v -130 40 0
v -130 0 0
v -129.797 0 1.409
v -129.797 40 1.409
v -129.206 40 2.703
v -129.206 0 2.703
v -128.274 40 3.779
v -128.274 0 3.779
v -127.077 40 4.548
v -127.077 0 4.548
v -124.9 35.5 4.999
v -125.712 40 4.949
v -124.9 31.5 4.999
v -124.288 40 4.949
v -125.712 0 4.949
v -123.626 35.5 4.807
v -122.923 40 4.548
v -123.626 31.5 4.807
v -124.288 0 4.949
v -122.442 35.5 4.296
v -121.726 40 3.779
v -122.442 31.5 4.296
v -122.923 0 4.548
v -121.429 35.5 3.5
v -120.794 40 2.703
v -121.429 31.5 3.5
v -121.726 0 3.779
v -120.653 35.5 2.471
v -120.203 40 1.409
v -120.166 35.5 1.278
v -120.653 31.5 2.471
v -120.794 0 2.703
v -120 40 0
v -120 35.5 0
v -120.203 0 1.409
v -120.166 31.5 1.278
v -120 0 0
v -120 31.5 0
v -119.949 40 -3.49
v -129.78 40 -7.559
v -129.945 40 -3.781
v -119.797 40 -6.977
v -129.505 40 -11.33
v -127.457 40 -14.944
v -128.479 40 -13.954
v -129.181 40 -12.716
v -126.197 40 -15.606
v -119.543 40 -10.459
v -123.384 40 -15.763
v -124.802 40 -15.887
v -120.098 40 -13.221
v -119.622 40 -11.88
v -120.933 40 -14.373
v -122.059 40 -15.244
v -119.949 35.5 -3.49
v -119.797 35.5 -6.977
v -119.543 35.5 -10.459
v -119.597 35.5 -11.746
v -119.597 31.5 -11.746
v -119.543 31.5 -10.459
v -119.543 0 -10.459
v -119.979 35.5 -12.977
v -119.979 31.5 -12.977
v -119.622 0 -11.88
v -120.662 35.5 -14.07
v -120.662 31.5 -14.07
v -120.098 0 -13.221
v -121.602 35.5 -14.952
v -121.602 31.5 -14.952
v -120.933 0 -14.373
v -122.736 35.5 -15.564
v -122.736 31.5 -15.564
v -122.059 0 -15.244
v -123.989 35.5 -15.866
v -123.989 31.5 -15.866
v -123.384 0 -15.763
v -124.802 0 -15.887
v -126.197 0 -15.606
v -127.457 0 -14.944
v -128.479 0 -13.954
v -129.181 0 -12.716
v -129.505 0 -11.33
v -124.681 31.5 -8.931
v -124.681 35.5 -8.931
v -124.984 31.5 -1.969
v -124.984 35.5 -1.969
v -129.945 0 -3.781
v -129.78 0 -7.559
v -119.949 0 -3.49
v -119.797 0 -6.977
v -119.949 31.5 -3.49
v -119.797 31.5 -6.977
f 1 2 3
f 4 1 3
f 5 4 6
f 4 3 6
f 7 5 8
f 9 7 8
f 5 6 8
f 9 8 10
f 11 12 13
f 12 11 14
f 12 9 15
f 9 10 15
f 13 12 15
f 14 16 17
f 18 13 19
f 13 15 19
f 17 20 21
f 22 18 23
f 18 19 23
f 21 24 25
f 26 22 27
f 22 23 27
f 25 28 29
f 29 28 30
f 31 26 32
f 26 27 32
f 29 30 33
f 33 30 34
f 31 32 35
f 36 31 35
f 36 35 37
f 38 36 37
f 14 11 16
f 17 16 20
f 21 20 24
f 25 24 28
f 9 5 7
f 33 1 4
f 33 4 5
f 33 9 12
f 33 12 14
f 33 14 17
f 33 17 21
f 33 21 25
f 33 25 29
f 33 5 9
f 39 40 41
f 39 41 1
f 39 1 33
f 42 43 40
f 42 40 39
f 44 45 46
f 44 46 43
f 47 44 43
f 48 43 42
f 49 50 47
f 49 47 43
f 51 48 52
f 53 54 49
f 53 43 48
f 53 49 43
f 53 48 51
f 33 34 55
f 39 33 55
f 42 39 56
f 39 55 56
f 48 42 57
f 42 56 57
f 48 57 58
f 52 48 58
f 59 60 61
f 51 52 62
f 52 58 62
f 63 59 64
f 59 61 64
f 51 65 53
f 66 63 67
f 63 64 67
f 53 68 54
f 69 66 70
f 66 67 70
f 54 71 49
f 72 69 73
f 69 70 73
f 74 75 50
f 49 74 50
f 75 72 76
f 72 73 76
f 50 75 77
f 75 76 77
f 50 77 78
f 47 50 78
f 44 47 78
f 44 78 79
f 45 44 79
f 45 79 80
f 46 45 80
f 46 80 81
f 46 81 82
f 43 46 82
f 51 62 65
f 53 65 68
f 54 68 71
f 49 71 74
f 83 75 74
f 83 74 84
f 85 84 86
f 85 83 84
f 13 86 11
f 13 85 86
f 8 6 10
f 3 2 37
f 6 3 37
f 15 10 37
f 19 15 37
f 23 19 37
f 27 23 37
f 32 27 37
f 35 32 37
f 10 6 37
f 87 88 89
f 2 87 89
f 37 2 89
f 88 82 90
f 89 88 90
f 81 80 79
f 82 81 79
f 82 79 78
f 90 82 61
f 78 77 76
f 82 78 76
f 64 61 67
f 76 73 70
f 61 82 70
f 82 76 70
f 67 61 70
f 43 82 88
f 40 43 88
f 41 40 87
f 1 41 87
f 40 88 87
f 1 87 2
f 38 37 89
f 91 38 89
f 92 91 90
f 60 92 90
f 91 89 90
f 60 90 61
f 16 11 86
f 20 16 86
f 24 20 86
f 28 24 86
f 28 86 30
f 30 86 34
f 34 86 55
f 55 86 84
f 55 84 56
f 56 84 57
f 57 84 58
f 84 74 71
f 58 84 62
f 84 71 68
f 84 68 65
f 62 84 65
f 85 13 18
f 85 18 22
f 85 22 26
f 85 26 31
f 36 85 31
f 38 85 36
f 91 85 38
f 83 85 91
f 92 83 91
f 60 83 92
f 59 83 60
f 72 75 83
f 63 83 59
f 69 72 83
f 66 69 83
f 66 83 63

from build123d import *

# Parameters (mm, degrees)
BOSS_EXTRUDE1_DEPTH = 40
CUT_EXTRUDE4_DEPTH  = 4


with BuildPart() as part:
    # Sketch1 → Boss-Extrude1 (new body)
    with BuildSketch(Plane(origin=(0, 0, 0), x_dir=(1, 0, 0), z_dir=(0, 1, 0))):
        with BuildLine():
            ThreePointArc((-129.505310752, 11.330246557), (-129.876268806, 5.670520357), (-130, 0))
            ThreePointArc((-130, 0), (-125, -5), (-120, 0))
            ThreePointArc((-120, 0), (-119.88578659, 5.234326484), (-119.543363771, 10.45868913))
            ThreePointArc((-119.543363771, 10.45868913), (-124.088558548, 15.875441334), (-129.505310752, 11.330246557))
        make_face()
    extrude(amount=BOSS_EXTRUDE1_DEPTH)

    # Sketch2 → Cut-Extrude4 (cut)
    with BuildSketch(Plane(origin=(0, 31.5, 0), x_dir=(1, 0, 0), z_dir=(0, 1, 0))):
        with BuildLine():
            ThreePointArc((-123.989026242, 15.865729465), (-124.881027698, 5.452423421), (-124.9, -4.9989999))
            ThreePointArc((-124.9, -4.9989999), (-121.429285786, -3.5), (-120, 0))
            ThreePointArc((-120, 0), (-119.88578659, 5.234326484), (-119.543363771, 10.45868913))
            ThreePointArc((-119.543363771, 10.45868913), (-120.662165593, 14.069941037), (-123.989026242, 15.865729465))
        make_face()
    extrude(amount=CUT_EXTRUDE4_DEPTH, mode=Mode.SUBTRACT)


solid = part.part
